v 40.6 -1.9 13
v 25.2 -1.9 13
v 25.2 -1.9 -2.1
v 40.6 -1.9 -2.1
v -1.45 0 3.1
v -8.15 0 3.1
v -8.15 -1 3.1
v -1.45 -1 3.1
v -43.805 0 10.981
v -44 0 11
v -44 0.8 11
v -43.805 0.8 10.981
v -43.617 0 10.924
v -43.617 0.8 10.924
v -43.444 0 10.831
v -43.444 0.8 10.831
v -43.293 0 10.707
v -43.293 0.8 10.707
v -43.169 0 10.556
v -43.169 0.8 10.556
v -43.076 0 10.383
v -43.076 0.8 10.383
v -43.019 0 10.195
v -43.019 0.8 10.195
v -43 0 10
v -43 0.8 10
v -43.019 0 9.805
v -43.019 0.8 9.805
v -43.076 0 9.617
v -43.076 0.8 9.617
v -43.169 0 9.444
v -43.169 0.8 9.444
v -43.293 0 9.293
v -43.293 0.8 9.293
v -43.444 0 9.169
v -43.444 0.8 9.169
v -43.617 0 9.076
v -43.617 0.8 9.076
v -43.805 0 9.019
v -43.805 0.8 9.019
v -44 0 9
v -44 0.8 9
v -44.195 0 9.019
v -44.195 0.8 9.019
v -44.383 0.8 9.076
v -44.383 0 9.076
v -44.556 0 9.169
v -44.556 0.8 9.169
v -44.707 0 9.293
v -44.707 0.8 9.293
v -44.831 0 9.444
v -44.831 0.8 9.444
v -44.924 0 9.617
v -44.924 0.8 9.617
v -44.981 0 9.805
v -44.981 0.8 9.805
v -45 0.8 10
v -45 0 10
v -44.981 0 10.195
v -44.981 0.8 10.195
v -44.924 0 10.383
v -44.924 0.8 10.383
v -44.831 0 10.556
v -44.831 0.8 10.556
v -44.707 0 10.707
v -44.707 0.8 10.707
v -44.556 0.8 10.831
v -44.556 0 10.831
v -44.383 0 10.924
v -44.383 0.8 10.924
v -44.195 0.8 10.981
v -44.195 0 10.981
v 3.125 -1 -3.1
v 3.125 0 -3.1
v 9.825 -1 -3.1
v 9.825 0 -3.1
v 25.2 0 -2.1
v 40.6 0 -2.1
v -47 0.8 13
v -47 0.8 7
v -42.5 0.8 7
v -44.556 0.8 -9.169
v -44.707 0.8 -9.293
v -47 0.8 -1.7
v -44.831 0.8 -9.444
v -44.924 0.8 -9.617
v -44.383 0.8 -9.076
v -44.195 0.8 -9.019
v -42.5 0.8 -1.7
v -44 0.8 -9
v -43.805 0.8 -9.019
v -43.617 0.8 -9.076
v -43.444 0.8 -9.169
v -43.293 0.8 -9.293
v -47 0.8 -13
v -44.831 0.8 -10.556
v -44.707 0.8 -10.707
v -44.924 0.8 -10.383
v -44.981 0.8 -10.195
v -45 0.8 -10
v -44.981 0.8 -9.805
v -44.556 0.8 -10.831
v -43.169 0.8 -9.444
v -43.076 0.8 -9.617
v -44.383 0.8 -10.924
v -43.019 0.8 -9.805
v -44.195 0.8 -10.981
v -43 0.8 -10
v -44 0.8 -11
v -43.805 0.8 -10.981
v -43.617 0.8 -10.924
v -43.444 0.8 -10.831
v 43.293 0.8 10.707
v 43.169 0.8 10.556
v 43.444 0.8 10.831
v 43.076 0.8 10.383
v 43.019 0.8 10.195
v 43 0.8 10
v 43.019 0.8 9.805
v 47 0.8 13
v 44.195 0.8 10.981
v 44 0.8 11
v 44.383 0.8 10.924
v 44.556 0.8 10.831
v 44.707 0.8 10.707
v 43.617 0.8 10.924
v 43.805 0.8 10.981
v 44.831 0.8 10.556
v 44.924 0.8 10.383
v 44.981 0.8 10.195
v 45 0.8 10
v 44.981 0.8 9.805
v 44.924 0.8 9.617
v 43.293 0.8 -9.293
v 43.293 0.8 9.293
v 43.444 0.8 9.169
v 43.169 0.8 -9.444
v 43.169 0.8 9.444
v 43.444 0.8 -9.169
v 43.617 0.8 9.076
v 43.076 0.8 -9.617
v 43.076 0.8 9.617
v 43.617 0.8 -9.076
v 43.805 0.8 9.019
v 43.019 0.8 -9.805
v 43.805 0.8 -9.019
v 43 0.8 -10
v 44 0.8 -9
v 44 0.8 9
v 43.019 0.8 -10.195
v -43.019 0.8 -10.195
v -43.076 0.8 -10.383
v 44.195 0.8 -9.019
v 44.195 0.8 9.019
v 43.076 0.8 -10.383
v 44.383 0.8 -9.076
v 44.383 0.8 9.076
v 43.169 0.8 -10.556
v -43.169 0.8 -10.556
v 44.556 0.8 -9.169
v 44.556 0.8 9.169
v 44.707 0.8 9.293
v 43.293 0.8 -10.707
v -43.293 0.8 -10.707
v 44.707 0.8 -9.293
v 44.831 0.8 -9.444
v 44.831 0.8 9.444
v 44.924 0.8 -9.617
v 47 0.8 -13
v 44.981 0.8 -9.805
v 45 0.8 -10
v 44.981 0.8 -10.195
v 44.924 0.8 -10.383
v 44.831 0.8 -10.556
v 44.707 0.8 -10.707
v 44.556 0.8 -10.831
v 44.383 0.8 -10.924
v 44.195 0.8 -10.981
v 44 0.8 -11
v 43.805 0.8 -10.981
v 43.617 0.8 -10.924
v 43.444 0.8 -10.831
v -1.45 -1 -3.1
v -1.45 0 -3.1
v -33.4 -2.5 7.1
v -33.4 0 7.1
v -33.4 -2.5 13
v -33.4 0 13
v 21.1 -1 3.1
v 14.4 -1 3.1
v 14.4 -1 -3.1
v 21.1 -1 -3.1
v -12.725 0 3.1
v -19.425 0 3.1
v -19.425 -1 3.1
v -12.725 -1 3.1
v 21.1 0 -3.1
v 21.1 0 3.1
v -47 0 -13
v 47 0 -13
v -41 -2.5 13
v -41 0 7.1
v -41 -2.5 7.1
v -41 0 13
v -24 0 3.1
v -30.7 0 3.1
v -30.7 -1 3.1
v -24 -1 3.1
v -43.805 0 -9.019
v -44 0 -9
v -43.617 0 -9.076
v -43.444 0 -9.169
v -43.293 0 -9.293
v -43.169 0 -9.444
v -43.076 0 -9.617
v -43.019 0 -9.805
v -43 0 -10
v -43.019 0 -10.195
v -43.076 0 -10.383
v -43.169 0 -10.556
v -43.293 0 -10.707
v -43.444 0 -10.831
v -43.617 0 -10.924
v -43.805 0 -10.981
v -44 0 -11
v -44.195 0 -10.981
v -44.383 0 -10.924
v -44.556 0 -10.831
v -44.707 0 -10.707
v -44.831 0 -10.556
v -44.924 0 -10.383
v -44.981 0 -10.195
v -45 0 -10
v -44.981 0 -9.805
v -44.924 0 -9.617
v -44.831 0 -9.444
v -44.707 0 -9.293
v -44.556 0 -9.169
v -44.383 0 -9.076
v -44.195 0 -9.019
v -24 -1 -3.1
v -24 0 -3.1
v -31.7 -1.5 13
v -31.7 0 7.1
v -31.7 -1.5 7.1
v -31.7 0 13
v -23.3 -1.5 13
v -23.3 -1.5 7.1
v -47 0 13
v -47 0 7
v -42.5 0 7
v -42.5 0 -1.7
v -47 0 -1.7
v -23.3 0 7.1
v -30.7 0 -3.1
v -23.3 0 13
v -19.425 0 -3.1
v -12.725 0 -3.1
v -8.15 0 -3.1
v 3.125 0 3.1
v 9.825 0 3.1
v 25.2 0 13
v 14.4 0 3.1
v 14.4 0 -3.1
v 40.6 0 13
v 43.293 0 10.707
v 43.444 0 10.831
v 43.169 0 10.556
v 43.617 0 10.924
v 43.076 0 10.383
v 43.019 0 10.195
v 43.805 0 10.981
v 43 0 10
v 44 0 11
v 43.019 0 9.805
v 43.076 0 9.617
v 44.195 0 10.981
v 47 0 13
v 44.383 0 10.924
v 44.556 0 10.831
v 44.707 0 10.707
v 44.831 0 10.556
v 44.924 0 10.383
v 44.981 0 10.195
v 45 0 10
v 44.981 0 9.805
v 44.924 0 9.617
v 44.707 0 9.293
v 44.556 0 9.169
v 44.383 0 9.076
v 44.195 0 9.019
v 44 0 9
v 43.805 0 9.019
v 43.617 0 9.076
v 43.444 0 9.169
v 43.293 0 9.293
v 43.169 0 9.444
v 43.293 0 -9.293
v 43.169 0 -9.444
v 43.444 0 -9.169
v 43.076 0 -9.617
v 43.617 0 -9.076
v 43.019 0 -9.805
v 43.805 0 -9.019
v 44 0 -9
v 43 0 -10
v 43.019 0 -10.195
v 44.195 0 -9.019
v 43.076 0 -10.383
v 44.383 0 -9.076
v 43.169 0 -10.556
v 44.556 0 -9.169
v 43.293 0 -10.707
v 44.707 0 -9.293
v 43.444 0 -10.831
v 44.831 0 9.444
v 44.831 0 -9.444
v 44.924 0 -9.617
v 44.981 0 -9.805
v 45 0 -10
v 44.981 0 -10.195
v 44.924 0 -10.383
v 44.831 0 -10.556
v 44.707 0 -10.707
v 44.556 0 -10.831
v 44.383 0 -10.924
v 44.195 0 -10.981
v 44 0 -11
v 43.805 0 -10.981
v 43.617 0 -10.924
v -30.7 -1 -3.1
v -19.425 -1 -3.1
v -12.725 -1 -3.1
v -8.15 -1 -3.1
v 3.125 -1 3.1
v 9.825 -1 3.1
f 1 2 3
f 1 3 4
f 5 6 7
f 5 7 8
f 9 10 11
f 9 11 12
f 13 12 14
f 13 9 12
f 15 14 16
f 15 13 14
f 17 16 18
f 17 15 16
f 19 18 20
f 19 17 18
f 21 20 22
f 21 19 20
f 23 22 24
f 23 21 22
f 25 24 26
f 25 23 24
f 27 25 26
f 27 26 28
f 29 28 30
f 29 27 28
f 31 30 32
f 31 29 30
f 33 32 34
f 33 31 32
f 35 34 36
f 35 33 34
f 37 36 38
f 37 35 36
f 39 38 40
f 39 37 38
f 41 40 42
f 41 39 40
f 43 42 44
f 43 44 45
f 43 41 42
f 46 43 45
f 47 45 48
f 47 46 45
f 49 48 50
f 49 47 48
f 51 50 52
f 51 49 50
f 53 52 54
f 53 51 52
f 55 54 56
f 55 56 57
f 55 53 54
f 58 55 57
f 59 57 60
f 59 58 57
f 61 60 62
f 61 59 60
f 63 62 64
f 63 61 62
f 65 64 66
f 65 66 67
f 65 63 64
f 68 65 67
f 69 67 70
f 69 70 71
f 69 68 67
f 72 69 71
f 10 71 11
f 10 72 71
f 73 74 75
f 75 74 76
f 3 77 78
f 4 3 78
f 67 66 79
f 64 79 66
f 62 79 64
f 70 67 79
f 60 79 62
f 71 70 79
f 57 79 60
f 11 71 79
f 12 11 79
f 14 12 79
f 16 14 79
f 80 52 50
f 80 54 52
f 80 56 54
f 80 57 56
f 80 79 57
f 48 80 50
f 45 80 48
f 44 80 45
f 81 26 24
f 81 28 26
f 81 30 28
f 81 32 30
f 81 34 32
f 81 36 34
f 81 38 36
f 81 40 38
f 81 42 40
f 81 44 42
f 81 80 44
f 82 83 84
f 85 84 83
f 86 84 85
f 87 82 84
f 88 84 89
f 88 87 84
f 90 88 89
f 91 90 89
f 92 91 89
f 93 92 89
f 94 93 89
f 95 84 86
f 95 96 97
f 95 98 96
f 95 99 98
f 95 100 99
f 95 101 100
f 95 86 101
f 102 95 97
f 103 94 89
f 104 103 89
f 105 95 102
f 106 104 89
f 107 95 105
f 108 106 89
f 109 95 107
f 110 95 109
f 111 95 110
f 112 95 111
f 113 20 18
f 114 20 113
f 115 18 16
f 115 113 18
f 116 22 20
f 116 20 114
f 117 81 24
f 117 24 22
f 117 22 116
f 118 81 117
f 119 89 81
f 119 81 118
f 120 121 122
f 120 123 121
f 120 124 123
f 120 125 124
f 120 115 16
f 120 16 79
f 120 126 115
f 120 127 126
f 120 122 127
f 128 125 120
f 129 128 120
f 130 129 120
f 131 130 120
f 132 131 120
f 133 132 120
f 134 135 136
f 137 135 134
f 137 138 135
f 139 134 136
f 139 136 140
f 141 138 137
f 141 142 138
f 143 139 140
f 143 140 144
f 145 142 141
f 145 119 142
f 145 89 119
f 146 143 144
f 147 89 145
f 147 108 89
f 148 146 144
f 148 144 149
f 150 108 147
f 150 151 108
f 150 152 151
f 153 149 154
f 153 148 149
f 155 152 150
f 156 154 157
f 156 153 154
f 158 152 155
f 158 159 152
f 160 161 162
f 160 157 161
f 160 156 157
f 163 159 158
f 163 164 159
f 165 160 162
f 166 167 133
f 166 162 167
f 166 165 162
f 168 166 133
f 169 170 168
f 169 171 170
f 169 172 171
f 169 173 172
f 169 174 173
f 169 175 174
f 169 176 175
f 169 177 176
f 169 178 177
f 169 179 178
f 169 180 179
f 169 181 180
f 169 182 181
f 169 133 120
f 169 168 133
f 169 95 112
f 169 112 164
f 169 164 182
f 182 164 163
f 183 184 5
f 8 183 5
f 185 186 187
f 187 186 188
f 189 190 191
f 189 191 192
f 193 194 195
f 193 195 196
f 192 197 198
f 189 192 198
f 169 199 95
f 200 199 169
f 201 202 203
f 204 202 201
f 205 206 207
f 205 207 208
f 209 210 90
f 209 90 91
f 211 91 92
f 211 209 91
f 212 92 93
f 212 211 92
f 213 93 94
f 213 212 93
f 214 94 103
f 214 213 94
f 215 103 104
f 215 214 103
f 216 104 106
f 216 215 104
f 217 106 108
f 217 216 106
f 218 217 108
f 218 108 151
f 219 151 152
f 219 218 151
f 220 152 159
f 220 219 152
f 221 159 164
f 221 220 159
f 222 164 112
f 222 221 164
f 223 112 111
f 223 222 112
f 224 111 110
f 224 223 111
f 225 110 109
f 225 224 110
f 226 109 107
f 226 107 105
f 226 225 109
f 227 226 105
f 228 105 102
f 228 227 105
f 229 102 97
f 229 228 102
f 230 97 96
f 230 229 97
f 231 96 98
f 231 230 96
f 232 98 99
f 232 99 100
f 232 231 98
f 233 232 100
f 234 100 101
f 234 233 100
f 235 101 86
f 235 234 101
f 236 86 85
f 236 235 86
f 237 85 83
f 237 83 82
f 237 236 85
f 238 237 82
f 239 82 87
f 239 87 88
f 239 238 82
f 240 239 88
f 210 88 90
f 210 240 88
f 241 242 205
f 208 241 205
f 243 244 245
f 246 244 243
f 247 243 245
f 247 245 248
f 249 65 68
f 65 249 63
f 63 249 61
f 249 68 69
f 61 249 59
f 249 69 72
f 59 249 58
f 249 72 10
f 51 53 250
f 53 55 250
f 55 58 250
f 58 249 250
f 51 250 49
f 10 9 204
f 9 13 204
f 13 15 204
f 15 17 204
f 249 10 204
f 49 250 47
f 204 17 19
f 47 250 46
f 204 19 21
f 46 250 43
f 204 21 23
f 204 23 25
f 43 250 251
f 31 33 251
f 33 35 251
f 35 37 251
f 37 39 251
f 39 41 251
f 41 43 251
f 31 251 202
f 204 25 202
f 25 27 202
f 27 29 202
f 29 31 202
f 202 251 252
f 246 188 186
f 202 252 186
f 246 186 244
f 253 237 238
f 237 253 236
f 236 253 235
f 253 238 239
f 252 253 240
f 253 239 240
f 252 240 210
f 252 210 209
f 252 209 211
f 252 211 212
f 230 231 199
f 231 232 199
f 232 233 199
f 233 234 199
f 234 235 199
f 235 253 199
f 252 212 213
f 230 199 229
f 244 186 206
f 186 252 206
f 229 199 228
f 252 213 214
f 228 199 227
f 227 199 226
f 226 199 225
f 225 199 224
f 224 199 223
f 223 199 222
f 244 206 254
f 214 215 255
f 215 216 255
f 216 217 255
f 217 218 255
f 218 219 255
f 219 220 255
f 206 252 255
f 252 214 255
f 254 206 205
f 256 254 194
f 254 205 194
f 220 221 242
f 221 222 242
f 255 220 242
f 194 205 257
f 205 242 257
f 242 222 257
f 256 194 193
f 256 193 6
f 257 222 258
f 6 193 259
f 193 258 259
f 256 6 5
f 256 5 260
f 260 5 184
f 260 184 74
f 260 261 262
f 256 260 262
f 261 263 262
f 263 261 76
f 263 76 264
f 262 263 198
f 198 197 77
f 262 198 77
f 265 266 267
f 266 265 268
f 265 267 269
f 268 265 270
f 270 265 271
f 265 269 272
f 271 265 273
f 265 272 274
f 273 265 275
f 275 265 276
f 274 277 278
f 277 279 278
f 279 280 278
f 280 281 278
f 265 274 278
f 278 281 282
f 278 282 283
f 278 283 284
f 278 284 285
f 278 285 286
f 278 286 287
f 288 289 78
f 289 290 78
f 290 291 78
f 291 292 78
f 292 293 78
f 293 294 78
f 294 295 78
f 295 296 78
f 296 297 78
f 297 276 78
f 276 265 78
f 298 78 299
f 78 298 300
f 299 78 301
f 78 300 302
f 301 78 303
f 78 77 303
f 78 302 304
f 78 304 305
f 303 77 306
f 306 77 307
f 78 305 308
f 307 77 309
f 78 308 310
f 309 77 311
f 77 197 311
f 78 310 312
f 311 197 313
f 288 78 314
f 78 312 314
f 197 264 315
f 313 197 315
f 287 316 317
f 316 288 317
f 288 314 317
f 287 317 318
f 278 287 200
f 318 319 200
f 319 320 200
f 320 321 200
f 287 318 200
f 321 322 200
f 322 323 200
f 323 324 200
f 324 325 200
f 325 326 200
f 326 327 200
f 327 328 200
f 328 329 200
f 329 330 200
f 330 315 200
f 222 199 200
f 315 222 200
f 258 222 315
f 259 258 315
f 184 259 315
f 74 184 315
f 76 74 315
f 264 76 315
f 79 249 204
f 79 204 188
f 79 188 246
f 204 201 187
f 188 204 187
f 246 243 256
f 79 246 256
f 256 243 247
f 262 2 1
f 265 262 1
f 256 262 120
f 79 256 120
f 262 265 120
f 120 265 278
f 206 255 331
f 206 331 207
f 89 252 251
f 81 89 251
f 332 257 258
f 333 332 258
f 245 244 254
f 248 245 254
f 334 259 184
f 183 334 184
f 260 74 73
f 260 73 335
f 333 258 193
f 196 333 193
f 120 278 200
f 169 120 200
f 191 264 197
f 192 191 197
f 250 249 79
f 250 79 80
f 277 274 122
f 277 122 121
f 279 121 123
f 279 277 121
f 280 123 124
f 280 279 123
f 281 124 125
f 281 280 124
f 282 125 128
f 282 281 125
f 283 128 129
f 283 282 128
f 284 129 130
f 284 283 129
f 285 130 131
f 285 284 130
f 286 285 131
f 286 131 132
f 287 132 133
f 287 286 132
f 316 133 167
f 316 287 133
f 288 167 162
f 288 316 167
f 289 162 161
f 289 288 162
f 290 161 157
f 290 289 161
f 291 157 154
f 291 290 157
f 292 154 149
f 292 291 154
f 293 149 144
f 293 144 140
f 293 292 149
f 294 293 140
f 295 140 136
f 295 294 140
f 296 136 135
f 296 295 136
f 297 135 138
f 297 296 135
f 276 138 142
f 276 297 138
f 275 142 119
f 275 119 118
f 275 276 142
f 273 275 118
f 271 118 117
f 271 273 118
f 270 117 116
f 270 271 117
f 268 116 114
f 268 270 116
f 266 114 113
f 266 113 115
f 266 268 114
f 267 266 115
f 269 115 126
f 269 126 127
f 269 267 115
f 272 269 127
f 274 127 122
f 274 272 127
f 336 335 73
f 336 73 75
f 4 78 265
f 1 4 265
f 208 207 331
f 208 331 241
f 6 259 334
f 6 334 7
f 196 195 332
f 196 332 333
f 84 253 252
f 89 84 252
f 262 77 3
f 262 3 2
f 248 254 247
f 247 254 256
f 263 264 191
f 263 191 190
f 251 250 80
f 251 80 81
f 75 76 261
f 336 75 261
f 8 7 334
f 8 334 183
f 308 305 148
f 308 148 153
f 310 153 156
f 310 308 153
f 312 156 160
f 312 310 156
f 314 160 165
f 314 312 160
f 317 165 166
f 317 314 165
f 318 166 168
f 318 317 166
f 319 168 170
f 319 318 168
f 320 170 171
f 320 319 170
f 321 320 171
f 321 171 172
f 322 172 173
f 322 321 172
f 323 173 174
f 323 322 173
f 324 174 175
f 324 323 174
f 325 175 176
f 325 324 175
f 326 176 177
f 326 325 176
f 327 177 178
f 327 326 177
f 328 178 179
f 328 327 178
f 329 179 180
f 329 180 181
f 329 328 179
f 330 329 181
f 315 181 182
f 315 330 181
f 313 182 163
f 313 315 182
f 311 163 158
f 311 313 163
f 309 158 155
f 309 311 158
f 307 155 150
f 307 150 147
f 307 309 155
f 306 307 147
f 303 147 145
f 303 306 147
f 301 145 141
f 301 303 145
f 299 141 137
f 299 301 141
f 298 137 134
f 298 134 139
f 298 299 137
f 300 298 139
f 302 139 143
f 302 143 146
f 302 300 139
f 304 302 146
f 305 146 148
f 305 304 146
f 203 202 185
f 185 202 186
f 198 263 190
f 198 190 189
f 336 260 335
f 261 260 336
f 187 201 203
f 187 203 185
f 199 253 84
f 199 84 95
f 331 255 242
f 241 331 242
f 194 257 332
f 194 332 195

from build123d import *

# Parameters (mm, degrees)
SKETCH_1_W          = 94
SKETCH_1_H          = 26
SKETCH_1_R          = 1
EXTRUDE_1_DEPTH     = 0.8
SKETCH_3_W          = 15.4
SKETCH_3_H          = 15.1
EXTRUDE_4_DEPTH     = 1.9
SKETCH_3_3_W        = 6.7
SKETCH_3_3_H        = 6.2
EXTRUDE_5_DEPTH     = 1
SKETCH_3_4_W        = 8.4
SKETCH_3_4_H        = 5.9
EXTRUDE_6_DEPTH     = 1.5
SKETCH_3_5_W        = 7.6
SKETCH_3_5_H        = 5.9
EXTRUDE_7_DEPTH     = 2.5
SKETCH_3_6_W        = 4.5
SKETCH_3_6_H        = 8.7
CUT_EXTRUDE_1_DEPTH = 49.828782496


with BuildPart() as part:
    # 草图1 → 凸台-拉伸1 (new body)
    with BuildSketch(Plane(origin=(0, 0, 0), x_dir=(1, 0, 0), z_dir=(0, 1, 0))):
        Rectangle(SKETCH_1_W, SKETCH_1_H)
        with Locations((-44, 10)):
            Circle(SKETCH_1_R, mode=Mode.SUBTRACT)
        with Locations((-44, -10)):
            Circle(SKETCH_1_R, mode=Mode.SUBTRACT)
        with Locations((44, 10)):
            Circle(SKETCH_1_R, mode=Mode.SUBTRACT)
        with Locations((44, -10)):
            Circle(SKETCH_1_R, mode=Mode.SUBTRACT)
    extrude(amount=EXTRUDE_1_DEPTH)

    # 草图3 → 凸台-拉伸4 (add)
    with BuildSketch(Plane.XZ):
        with Locations((32.9, 5.45)):
            Rectangle(SKETCH_3_W, SKETCH_3_H)
    extrude(amount=EXTRUDE_4_DEPTH)

    # 草图3<3> → 凸台-拉伸5 (add)
    with BuildSketch(Plane.XZ):
        with Locations((-27.35, 0)):
            Rectangle(SKETCH_3_3_W, SKETCH_3_3_H)
        with Locations((-16.075, 0)):
            Rectangle(SKETCH_3_3_W, SKETCH_3_3_H)
        with Locations((-4.8, 0)):
            Rectangle(SKETCH_3_3_W, SKETCH_3_3_H)
        with Locations((6.475, 0)):
            Rectangle(SKETCH_3_3_W, SKETCH_3_3_H)
        with Locations((17.75, 0)):
            Rectangle(SKETCH_3_3_W, SKETCH_3_3_H)
    extrude(amount=EXTRUDE_5_DEPTH)

    # 草图3<4> → 凸台-拉伸6 (add)
    with BuildSketch(Plane.XZ):
        with Locations((-27.5, 10.05)):
            Rectangle(SKETCH_3_4_W, SKETCH_3_4_H)
    extrude(amount=EXTRUDE_6_DEPTH)

    # 草图3<5> → 凸台-拉伸7 (add)
    with BuildSketch(Plane.XZ):
        with Locations((-37.2, 10.05)):
            Rectangle(SKETCH_3_5_W, SKETCH_3_5_H)
    extrude(amount=EXTRUDE_7_DEPTH)

    # 草图3<6> → 切除-拉伸1 (cut, through all)
    with BuildSketch(Plane.XZ):
        with Locations((-44.75, 2.65)):
            Rectangle(SKETCH_3_6_W, SKETCH_3_6_H)
    extrude(amount=-CUT_EXTRUDE_1_DEPTH, mode=Mode.SUBTRACT)


solid = part.part
